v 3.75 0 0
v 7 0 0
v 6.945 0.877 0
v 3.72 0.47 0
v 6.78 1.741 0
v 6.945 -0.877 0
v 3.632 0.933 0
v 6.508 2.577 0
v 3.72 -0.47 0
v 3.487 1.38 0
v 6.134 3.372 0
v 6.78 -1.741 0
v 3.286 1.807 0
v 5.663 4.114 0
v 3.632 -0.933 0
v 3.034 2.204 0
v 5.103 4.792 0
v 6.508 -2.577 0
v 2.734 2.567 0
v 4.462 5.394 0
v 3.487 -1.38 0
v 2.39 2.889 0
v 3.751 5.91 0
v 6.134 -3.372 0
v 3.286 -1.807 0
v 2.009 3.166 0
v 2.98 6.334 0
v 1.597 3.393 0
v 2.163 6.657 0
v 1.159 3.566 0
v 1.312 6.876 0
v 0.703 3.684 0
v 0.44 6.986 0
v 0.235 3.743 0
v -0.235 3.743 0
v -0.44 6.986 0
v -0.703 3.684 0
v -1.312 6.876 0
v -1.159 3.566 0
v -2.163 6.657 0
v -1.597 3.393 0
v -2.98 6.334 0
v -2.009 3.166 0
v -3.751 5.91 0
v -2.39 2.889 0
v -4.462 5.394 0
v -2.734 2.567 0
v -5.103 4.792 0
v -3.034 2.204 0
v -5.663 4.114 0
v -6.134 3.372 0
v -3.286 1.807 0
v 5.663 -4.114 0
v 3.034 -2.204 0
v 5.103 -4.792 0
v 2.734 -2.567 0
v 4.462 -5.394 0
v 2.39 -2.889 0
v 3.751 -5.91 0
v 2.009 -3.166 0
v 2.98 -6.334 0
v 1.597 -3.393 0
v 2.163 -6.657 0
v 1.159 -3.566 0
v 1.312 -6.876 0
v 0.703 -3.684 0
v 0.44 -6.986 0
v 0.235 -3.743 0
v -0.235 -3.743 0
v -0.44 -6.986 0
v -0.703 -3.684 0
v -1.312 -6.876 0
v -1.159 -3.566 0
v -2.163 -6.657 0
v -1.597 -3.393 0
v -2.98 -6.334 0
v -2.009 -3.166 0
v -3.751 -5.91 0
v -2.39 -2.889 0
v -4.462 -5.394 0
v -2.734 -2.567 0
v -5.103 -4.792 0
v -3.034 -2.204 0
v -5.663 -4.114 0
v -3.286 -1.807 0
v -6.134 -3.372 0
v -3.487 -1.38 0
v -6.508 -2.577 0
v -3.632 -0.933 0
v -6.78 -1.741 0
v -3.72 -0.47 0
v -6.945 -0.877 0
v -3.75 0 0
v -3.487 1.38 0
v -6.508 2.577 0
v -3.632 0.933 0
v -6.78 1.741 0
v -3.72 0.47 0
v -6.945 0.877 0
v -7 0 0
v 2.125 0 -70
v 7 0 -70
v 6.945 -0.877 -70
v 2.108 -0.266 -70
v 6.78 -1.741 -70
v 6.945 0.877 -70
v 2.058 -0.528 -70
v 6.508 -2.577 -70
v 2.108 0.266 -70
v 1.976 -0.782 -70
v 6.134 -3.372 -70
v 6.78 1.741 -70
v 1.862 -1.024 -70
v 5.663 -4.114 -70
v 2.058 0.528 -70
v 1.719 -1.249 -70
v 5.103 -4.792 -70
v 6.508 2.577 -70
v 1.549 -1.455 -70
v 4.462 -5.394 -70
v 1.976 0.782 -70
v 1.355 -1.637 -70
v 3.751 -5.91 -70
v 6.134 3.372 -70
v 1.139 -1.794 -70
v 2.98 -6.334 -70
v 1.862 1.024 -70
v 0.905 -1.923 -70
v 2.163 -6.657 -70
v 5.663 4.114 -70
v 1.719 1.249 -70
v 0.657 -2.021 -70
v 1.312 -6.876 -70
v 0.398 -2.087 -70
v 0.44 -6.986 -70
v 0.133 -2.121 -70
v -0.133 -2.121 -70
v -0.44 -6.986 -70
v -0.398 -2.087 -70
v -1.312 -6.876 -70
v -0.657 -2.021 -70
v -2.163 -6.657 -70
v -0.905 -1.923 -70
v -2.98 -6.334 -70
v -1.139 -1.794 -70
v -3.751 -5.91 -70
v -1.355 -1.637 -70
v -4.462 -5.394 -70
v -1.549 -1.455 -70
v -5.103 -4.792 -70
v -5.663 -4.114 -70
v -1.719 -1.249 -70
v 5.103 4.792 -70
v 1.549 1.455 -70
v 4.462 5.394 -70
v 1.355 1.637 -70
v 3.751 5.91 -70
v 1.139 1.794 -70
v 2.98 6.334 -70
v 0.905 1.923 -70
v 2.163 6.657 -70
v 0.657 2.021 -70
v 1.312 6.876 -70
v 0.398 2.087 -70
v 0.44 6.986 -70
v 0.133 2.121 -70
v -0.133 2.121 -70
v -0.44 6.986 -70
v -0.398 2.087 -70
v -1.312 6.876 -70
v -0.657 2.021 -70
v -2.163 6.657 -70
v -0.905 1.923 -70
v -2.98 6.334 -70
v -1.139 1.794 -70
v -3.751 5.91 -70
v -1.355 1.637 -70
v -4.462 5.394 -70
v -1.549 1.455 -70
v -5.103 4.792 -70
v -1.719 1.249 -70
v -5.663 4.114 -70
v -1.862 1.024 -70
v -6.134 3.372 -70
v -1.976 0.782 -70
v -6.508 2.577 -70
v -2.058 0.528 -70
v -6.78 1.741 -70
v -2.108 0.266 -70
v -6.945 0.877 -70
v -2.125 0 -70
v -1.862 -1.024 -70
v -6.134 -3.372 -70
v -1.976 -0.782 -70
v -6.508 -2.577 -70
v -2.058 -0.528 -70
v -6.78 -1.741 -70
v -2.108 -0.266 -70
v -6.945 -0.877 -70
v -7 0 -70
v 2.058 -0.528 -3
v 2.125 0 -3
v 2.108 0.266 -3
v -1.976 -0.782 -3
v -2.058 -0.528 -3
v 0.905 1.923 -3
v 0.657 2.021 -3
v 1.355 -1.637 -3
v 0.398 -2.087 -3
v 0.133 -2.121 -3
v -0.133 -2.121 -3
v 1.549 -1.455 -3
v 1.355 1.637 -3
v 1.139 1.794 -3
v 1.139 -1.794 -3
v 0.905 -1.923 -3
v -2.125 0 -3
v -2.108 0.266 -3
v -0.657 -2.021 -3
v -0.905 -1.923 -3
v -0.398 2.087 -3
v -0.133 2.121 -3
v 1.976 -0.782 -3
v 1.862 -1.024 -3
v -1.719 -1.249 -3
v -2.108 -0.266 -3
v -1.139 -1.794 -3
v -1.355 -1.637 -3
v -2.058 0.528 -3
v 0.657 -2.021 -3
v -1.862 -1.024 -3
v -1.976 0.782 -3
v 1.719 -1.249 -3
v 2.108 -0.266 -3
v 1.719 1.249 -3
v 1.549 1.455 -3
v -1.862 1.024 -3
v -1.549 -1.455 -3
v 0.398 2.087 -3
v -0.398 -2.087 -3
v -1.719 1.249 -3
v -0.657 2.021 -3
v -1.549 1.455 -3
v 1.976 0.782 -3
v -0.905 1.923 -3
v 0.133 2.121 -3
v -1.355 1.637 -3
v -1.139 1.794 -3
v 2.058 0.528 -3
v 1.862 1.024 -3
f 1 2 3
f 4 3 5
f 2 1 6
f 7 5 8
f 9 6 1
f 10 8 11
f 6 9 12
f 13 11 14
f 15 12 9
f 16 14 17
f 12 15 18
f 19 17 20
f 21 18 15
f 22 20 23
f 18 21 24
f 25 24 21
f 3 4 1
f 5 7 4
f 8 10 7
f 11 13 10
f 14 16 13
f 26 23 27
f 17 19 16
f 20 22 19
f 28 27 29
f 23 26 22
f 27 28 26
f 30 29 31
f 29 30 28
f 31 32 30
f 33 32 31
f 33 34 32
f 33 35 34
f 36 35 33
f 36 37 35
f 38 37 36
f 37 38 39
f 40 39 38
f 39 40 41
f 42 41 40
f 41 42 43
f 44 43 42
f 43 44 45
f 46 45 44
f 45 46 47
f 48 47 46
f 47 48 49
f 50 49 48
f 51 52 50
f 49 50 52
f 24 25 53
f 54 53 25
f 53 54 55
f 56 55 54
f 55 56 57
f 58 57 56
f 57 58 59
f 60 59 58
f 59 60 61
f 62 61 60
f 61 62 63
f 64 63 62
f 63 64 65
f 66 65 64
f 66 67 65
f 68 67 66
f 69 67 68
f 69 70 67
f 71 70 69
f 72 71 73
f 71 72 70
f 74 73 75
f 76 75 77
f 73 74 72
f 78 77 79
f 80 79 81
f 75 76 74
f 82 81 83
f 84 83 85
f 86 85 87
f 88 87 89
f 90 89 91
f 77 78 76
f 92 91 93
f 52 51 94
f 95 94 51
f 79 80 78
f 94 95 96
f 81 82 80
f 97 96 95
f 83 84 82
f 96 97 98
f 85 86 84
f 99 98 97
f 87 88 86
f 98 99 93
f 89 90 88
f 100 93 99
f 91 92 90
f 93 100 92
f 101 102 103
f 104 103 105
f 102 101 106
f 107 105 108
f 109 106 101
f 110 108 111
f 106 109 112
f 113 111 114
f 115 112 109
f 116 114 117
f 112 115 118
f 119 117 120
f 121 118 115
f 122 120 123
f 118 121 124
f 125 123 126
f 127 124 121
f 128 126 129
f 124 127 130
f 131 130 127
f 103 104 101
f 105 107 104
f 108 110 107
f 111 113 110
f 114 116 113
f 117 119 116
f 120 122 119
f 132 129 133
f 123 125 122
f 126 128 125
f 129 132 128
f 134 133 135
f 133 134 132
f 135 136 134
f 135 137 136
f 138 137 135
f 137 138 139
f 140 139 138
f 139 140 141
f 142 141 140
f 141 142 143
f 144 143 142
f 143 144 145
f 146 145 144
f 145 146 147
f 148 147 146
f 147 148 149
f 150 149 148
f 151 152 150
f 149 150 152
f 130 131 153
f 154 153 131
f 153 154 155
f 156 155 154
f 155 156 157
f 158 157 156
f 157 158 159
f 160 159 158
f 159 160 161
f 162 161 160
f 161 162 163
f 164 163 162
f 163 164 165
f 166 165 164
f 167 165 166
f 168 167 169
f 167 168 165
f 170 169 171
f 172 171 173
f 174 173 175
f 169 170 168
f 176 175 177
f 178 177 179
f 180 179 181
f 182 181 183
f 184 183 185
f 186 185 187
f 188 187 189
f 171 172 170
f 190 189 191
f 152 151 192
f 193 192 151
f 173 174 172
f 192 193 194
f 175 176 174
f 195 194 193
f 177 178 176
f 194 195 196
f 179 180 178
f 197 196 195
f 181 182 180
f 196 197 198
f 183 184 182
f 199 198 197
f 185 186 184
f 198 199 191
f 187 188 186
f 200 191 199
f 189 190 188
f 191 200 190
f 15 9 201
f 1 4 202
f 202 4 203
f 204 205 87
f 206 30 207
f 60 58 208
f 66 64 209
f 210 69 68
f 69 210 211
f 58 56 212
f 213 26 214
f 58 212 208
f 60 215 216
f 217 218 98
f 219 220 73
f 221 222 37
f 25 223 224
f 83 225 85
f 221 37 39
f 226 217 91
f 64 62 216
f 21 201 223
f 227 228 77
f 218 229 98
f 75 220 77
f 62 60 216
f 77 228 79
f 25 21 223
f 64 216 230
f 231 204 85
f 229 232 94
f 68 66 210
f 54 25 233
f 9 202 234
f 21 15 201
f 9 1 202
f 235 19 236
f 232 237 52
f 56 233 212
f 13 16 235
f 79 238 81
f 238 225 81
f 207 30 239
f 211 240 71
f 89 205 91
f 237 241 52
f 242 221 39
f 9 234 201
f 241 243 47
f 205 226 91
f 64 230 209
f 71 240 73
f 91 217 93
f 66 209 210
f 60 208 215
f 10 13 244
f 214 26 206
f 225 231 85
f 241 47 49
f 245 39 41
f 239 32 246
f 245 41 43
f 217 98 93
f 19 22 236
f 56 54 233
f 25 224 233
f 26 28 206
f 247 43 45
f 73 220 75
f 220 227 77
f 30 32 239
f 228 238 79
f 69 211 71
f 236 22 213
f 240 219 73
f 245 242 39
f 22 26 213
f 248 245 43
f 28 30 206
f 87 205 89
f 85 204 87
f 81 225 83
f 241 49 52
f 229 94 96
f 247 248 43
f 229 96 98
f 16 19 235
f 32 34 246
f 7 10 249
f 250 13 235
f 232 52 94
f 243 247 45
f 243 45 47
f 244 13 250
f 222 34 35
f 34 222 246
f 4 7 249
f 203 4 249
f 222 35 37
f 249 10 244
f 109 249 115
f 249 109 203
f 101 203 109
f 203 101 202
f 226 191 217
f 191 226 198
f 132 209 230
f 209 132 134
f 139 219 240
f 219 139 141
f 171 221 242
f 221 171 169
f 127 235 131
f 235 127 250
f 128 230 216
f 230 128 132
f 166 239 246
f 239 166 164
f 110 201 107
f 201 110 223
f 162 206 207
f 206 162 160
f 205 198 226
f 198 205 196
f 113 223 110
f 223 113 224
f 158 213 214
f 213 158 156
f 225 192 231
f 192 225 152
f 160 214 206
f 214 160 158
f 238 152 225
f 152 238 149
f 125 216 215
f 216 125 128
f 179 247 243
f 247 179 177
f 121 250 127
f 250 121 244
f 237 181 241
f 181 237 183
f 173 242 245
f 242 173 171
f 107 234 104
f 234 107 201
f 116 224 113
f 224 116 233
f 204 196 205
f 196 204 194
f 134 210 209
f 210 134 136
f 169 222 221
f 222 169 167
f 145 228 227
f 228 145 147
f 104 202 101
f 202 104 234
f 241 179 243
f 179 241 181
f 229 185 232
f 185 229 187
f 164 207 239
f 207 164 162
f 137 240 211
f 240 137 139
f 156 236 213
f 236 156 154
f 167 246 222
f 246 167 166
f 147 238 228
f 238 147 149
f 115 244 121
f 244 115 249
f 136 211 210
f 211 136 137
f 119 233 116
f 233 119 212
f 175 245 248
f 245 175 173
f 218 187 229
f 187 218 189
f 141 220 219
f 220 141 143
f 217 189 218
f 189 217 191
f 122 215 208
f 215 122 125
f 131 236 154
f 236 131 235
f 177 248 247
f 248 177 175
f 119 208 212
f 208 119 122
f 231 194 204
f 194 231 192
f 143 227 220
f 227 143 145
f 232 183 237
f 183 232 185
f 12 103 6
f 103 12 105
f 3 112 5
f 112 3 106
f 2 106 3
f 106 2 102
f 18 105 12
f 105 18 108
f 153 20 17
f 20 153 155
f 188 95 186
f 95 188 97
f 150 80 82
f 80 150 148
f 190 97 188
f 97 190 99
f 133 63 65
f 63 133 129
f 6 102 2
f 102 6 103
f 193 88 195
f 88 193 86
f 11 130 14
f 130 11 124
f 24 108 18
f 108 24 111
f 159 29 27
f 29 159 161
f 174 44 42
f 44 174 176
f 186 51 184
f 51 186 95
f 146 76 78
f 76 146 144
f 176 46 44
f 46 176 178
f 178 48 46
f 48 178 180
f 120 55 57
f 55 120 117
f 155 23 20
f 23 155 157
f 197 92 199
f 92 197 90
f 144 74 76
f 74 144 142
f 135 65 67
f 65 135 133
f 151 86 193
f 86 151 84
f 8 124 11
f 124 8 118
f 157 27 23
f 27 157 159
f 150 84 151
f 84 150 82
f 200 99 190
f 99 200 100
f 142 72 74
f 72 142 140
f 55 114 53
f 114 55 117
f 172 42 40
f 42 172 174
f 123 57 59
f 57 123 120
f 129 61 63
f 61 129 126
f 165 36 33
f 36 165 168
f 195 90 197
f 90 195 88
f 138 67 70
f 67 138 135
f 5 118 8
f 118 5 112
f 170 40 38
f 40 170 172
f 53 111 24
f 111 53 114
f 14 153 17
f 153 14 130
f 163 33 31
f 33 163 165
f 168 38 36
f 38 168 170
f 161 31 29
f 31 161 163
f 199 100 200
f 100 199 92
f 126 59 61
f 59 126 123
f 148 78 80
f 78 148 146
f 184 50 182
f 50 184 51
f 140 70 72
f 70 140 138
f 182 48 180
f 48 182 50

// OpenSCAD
$fn = 50;


difference() {
	union() {
		translate(v = [0, 0, -70.0000000000]) {
			cylinder(h = 70, r = 7.0000000000);
		}
	}
	union() {
		translate(v = [0, 0, 0]) {
			rotate(a = [0, 0, 0]) {
				difference() {
					union() {
						#translate(v = [0, 0, -70.0000000000]) {
							cylinder(h = 70, r = 2.0000000000);
						}
						#translate(v = [0, 0, -3]) {
							cylinder(h = 3, r = 7.0000000000, r1 = 2.1250000000, r2 = 3.7500000000);
						}
						#translate(v = [0, 0, -70.0000000000]) {
							cylinder(h = 70, r = 2.1250000000);
						}
						#translate(v = [0, 0, -70.0000000000]) {
							cylinder(h = 70, r = 2.0000000000);
						}
					}
					union();
				}
			}
		}
	}
}
